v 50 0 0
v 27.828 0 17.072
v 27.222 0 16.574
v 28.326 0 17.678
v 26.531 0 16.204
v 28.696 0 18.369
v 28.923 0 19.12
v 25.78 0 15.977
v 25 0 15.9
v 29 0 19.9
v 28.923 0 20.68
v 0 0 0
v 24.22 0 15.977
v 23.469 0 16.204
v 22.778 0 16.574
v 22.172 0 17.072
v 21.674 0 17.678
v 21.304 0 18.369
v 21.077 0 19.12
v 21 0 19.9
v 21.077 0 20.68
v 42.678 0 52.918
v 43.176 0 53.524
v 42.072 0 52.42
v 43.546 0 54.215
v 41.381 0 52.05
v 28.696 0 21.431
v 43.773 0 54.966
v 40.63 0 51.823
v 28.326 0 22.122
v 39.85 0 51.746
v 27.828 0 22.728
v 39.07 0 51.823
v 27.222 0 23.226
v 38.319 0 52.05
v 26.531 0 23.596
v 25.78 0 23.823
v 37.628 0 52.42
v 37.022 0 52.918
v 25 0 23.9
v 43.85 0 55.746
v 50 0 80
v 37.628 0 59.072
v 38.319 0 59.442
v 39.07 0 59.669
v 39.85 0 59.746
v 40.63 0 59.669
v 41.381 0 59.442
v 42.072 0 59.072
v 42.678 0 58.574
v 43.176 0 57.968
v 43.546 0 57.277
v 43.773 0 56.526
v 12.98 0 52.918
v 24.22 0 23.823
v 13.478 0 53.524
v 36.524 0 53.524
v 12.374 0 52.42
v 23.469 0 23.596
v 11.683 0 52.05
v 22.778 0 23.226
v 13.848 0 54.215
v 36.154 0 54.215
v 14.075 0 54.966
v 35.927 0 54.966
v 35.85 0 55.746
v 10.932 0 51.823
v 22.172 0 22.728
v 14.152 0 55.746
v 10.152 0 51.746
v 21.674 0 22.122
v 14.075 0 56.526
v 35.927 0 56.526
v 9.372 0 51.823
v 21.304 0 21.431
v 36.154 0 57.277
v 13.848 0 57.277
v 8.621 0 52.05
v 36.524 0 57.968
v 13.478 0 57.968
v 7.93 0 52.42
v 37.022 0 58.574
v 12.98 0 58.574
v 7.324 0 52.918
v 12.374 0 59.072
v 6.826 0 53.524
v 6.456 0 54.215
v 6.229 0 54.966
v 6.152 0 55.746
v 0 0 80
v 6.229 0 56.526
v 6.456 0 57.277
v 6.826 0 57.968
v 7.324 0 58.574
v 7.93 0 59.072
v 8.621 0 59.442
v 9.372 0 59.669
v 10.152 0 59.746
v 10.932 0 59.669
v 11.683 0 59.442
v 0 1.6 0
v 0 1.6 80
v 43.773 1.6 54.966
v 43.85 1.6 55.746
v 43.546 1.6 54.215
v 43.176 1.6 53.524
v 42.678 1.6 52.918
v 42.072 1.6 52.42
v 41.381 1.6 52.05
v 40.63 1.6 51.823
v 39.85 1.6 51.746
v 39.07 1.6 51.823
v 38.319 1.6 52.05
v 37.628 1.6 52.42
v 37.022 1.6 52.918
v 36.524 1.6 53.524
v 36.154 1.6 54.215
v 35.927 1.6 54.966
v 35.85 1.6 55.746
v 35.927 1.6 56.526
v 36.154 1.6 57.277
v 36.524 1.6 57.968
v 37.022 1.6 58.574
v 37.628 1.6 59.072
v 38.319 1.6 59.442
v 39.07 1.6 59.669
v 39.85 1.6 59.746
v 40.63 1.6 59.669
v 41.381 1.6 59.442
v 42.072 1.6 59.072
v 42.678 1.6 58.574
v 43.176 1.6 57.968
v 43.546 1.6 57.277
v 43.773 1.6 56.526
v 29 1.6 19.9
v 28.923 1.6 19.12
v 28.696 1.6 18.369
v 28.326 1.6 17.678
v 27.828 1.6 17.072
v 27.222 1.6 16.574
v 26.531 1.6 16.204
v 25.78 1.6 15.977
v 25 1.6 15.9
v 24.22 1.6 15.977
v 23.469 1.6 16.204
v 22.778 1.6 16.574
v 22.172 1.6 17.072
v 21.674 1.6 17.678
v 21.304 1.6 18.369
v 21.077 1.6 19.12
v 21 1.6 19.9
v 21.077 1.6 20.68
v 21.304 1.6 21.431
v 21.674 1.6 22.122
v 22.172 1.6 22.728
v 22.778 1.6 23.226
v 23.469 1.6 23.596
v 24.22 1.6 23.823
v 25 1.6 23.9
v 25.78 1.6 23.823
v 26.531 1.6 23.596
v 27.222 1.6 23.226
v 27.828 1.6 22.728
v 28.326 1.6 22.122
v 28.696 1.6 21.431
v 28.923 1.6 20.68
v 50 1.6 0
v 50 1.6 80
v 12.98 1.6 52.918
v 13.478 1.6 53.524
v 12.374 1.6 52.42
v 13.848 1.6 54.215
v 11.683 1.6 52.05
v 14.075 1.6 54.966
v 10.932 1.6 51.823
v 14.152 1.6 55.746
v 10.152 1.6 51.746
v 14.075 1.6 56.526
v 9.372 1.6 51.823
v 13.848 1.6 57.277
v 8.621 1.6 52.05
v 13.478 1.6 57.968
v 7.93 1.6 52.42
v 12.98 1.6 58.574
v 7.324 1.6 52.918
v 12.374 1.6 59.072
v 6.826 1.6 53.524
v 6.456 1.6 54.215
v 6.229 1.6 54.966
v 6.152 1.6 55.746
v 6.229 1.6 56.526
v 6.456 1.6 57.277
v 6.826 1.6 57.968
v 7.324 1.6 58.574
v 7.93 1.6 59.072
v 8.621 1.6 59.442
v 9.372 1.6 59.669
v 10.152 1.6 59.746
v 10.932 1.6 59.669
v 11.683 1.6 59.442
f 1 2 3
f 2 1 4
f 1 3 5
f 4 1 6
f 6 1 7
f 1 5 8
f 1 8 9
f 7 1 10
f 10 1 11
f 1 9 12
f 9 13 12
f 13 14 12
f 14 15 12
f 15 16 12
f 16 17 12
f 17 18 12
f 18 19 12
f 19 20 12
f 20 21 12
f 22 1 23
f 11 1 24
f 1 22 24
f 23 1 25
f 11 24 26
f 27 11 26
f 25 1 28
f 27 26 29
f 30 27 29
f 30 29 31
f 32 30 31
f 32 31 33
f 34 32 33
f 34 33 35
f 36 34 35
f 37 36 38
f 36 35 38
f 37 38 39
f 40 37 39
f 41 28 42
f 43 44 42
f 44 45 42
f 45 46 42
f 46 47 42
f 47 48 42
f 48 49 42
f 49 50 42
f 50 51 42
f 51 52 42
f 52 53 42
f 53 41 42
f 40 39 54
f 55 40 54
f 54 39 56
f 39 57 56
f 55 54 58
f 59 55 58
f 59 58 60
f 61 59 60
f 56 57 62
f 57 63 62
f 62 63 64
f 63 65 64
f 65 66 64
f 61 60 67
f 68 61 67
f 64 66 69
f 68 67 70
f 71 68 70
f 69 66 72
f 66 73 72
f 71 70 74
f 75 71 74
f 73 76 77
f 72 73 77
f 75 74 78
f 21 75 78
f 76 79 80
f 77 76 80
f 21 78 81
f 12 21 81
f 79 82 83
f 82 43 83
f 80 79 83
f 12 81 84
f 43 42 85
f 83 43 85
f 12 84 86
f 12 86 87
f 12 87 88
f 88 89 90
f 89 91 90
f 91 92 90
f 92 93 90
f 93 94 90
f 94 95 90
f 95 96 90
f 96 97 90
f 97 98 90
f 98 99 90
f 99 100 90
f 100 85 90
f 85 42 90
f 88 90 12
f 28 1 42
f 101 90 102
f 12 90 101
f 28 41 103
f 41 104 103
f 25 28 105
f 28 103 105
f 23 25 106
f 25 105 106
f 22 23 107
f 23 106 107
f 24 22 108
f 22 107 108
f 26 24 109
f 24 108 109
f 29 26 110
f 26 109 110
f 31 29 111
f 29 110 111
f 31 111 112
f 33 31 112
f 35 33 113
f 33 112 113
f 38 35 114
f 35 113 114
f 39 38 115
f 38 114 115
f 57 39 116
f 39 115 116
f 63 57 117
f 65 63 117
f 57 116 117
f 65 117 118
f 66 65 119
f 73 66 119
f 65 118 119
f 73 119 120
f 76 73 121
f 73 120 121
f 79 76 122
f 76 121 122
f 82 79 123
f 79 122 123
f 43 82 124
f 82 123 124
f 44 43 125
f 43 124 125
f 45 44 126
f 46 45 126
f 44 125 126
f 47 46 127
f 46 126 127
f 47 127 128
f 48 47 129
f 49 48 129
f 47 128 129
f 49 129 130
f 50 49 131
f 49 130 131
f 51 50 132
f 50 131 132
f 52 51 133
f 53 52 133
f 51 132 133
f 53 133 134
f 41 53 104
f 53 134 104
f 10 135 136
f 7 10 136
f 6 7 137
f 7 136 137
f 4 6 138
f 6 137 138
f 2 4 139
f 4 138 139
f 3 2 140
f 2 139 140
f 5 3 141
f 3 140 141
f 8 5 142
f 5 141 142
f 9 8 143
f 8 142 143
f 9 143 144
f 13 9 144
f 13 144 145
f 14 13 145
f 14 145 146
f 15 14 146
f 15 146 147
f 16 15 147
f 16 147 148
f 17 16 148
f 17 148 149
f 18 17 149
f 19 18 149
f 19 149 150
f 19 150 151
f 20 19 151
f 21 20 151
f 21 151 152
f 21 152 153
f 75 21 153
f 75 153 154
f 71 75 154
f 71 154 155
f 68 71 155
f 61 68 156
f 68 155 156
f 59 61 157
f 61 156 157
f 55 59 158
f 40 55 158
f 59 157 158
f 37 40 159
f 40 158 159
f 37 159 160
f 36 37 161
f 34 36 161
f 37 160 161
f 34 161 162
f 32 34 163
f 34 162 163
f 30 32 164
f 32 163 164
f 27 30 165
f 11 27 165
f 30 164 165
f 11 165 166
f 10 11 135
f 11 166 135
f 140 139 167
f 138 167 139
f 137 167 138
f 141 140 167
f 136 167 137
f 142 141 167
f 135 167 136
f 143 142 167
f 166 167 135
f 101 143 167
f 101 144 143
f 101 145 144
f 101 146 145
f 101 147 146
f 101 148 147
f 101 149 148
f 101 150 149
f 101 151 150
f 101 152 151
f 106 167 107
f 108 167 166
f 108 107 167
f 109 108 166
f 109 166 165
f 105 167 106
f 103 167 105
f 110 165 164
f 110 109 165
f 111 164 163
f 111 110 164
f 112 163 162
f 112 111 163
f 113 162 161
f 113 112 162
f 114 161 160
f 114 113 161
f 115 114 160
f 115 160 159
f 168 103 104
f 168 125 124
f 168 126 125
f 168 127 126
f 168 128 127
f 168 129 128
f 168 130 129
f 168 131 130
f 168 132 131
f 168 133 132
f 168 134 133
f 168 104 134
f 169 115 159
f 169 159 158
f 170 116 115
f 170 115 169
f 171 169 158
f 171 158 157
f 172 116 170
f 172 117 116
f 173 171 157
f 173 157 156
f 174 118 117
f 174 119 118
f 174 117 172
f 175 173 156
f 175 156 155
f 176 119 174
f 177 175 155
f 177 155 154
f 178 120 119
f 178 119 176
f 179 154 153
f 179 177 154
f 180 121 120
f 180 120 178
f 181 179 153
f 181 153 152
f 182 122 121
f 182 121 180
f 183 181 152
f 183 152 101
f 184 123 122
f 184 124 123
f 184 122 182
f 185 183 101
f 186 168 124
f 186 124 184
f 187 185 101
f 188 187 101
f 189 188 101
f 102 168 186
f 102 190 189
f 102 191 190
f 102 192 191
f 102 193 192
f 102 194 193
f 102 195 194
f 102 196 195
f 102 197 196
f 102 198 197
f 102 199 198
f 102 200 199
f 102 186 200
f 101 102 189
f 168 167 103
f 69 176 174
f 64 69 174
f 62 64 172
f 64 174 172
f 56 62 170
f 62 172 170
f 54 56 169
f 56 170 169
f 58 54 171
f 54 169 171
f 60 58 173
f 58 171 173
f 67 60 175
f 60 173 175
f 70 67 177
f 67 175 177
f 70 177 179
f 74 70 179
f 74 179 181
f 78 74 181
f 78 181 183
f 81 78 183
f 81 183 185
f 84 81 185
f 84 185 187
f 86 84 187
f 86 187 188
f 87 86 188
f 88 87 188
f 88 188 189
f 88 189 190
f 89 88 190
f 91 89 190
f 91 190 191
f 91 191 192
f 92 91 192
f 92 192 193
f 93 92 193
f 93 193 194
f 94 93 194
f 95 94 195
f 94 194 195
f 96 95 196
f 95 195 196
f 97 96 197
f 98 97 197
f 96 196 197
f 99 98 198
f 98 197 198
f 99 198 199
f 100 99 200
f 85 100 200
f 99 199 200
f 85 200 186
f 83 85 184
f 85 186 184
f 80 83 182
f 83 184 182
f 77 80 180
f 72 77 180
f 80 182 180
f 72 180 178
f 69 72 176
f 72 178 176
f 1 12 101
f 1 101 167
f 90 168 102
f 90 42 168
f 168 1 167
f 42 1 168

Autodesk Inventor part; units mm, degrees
ref_plane "YZ Plane" through (0, 0, 0) normal (1, 0, 0) x (0, 1, 0)
ref_plane "XZ Plane" through (0, 0, 0) normal (0, 1, 0) x (-1, 0, 0)
ref_plane "XY Plane" through (0, 0, 0) normal (0, 0, 1) x (1, 0, 0)
sketch "Sketch1" plane through (0, 0, 0) normal (0, 1, 0) x (-1, 0, 0)
  line L0 (0, 0) -> (-50, 0)
  line L1 (-50, 0) -> (-50, 80)
  line L2 (-50, 80) -> (0, 80)
  line L3 (0, 80) -> (0, 0)
  dimension "d0" = 50
  dimension "d1" = 80
extrude "Extrusion1" add sketch "Sketch1" along normal blind 1.6
sketch "Sketch2" plane through (0, 1.6, 0) normal (0, 1, 0) x (1, 0, 0)
  circle A0 centre (10.152, -55.746) radius 4
  line L0 (0, 0) -> (0, -80) projected
  line L1 (50, 0) -> (0, 0) projected
  line L2 (0, -80) -> (50, -80) projected
  circle A1 centre (39.85, -55.746) radius 4
  circle A2 centre (25, -19.9) radius 4
  point P0 (25, -80)
  dimension "d4" = 10.152
  dimension "d5" = 8
  dimension "d9" = 24.254
  dimension "d10" = 8
  dimension "d11" = 29.698
  dimension "d12" = 8
  dimension "d13" = 19.9
extrude "Holes for" cut sketch "Sketch2" against normal blind 10
equation "\"d12\" = d10"
properties part number "2020-04-02-10-10401-Outline_ConnectorPCB" material "ABS Plastic"
